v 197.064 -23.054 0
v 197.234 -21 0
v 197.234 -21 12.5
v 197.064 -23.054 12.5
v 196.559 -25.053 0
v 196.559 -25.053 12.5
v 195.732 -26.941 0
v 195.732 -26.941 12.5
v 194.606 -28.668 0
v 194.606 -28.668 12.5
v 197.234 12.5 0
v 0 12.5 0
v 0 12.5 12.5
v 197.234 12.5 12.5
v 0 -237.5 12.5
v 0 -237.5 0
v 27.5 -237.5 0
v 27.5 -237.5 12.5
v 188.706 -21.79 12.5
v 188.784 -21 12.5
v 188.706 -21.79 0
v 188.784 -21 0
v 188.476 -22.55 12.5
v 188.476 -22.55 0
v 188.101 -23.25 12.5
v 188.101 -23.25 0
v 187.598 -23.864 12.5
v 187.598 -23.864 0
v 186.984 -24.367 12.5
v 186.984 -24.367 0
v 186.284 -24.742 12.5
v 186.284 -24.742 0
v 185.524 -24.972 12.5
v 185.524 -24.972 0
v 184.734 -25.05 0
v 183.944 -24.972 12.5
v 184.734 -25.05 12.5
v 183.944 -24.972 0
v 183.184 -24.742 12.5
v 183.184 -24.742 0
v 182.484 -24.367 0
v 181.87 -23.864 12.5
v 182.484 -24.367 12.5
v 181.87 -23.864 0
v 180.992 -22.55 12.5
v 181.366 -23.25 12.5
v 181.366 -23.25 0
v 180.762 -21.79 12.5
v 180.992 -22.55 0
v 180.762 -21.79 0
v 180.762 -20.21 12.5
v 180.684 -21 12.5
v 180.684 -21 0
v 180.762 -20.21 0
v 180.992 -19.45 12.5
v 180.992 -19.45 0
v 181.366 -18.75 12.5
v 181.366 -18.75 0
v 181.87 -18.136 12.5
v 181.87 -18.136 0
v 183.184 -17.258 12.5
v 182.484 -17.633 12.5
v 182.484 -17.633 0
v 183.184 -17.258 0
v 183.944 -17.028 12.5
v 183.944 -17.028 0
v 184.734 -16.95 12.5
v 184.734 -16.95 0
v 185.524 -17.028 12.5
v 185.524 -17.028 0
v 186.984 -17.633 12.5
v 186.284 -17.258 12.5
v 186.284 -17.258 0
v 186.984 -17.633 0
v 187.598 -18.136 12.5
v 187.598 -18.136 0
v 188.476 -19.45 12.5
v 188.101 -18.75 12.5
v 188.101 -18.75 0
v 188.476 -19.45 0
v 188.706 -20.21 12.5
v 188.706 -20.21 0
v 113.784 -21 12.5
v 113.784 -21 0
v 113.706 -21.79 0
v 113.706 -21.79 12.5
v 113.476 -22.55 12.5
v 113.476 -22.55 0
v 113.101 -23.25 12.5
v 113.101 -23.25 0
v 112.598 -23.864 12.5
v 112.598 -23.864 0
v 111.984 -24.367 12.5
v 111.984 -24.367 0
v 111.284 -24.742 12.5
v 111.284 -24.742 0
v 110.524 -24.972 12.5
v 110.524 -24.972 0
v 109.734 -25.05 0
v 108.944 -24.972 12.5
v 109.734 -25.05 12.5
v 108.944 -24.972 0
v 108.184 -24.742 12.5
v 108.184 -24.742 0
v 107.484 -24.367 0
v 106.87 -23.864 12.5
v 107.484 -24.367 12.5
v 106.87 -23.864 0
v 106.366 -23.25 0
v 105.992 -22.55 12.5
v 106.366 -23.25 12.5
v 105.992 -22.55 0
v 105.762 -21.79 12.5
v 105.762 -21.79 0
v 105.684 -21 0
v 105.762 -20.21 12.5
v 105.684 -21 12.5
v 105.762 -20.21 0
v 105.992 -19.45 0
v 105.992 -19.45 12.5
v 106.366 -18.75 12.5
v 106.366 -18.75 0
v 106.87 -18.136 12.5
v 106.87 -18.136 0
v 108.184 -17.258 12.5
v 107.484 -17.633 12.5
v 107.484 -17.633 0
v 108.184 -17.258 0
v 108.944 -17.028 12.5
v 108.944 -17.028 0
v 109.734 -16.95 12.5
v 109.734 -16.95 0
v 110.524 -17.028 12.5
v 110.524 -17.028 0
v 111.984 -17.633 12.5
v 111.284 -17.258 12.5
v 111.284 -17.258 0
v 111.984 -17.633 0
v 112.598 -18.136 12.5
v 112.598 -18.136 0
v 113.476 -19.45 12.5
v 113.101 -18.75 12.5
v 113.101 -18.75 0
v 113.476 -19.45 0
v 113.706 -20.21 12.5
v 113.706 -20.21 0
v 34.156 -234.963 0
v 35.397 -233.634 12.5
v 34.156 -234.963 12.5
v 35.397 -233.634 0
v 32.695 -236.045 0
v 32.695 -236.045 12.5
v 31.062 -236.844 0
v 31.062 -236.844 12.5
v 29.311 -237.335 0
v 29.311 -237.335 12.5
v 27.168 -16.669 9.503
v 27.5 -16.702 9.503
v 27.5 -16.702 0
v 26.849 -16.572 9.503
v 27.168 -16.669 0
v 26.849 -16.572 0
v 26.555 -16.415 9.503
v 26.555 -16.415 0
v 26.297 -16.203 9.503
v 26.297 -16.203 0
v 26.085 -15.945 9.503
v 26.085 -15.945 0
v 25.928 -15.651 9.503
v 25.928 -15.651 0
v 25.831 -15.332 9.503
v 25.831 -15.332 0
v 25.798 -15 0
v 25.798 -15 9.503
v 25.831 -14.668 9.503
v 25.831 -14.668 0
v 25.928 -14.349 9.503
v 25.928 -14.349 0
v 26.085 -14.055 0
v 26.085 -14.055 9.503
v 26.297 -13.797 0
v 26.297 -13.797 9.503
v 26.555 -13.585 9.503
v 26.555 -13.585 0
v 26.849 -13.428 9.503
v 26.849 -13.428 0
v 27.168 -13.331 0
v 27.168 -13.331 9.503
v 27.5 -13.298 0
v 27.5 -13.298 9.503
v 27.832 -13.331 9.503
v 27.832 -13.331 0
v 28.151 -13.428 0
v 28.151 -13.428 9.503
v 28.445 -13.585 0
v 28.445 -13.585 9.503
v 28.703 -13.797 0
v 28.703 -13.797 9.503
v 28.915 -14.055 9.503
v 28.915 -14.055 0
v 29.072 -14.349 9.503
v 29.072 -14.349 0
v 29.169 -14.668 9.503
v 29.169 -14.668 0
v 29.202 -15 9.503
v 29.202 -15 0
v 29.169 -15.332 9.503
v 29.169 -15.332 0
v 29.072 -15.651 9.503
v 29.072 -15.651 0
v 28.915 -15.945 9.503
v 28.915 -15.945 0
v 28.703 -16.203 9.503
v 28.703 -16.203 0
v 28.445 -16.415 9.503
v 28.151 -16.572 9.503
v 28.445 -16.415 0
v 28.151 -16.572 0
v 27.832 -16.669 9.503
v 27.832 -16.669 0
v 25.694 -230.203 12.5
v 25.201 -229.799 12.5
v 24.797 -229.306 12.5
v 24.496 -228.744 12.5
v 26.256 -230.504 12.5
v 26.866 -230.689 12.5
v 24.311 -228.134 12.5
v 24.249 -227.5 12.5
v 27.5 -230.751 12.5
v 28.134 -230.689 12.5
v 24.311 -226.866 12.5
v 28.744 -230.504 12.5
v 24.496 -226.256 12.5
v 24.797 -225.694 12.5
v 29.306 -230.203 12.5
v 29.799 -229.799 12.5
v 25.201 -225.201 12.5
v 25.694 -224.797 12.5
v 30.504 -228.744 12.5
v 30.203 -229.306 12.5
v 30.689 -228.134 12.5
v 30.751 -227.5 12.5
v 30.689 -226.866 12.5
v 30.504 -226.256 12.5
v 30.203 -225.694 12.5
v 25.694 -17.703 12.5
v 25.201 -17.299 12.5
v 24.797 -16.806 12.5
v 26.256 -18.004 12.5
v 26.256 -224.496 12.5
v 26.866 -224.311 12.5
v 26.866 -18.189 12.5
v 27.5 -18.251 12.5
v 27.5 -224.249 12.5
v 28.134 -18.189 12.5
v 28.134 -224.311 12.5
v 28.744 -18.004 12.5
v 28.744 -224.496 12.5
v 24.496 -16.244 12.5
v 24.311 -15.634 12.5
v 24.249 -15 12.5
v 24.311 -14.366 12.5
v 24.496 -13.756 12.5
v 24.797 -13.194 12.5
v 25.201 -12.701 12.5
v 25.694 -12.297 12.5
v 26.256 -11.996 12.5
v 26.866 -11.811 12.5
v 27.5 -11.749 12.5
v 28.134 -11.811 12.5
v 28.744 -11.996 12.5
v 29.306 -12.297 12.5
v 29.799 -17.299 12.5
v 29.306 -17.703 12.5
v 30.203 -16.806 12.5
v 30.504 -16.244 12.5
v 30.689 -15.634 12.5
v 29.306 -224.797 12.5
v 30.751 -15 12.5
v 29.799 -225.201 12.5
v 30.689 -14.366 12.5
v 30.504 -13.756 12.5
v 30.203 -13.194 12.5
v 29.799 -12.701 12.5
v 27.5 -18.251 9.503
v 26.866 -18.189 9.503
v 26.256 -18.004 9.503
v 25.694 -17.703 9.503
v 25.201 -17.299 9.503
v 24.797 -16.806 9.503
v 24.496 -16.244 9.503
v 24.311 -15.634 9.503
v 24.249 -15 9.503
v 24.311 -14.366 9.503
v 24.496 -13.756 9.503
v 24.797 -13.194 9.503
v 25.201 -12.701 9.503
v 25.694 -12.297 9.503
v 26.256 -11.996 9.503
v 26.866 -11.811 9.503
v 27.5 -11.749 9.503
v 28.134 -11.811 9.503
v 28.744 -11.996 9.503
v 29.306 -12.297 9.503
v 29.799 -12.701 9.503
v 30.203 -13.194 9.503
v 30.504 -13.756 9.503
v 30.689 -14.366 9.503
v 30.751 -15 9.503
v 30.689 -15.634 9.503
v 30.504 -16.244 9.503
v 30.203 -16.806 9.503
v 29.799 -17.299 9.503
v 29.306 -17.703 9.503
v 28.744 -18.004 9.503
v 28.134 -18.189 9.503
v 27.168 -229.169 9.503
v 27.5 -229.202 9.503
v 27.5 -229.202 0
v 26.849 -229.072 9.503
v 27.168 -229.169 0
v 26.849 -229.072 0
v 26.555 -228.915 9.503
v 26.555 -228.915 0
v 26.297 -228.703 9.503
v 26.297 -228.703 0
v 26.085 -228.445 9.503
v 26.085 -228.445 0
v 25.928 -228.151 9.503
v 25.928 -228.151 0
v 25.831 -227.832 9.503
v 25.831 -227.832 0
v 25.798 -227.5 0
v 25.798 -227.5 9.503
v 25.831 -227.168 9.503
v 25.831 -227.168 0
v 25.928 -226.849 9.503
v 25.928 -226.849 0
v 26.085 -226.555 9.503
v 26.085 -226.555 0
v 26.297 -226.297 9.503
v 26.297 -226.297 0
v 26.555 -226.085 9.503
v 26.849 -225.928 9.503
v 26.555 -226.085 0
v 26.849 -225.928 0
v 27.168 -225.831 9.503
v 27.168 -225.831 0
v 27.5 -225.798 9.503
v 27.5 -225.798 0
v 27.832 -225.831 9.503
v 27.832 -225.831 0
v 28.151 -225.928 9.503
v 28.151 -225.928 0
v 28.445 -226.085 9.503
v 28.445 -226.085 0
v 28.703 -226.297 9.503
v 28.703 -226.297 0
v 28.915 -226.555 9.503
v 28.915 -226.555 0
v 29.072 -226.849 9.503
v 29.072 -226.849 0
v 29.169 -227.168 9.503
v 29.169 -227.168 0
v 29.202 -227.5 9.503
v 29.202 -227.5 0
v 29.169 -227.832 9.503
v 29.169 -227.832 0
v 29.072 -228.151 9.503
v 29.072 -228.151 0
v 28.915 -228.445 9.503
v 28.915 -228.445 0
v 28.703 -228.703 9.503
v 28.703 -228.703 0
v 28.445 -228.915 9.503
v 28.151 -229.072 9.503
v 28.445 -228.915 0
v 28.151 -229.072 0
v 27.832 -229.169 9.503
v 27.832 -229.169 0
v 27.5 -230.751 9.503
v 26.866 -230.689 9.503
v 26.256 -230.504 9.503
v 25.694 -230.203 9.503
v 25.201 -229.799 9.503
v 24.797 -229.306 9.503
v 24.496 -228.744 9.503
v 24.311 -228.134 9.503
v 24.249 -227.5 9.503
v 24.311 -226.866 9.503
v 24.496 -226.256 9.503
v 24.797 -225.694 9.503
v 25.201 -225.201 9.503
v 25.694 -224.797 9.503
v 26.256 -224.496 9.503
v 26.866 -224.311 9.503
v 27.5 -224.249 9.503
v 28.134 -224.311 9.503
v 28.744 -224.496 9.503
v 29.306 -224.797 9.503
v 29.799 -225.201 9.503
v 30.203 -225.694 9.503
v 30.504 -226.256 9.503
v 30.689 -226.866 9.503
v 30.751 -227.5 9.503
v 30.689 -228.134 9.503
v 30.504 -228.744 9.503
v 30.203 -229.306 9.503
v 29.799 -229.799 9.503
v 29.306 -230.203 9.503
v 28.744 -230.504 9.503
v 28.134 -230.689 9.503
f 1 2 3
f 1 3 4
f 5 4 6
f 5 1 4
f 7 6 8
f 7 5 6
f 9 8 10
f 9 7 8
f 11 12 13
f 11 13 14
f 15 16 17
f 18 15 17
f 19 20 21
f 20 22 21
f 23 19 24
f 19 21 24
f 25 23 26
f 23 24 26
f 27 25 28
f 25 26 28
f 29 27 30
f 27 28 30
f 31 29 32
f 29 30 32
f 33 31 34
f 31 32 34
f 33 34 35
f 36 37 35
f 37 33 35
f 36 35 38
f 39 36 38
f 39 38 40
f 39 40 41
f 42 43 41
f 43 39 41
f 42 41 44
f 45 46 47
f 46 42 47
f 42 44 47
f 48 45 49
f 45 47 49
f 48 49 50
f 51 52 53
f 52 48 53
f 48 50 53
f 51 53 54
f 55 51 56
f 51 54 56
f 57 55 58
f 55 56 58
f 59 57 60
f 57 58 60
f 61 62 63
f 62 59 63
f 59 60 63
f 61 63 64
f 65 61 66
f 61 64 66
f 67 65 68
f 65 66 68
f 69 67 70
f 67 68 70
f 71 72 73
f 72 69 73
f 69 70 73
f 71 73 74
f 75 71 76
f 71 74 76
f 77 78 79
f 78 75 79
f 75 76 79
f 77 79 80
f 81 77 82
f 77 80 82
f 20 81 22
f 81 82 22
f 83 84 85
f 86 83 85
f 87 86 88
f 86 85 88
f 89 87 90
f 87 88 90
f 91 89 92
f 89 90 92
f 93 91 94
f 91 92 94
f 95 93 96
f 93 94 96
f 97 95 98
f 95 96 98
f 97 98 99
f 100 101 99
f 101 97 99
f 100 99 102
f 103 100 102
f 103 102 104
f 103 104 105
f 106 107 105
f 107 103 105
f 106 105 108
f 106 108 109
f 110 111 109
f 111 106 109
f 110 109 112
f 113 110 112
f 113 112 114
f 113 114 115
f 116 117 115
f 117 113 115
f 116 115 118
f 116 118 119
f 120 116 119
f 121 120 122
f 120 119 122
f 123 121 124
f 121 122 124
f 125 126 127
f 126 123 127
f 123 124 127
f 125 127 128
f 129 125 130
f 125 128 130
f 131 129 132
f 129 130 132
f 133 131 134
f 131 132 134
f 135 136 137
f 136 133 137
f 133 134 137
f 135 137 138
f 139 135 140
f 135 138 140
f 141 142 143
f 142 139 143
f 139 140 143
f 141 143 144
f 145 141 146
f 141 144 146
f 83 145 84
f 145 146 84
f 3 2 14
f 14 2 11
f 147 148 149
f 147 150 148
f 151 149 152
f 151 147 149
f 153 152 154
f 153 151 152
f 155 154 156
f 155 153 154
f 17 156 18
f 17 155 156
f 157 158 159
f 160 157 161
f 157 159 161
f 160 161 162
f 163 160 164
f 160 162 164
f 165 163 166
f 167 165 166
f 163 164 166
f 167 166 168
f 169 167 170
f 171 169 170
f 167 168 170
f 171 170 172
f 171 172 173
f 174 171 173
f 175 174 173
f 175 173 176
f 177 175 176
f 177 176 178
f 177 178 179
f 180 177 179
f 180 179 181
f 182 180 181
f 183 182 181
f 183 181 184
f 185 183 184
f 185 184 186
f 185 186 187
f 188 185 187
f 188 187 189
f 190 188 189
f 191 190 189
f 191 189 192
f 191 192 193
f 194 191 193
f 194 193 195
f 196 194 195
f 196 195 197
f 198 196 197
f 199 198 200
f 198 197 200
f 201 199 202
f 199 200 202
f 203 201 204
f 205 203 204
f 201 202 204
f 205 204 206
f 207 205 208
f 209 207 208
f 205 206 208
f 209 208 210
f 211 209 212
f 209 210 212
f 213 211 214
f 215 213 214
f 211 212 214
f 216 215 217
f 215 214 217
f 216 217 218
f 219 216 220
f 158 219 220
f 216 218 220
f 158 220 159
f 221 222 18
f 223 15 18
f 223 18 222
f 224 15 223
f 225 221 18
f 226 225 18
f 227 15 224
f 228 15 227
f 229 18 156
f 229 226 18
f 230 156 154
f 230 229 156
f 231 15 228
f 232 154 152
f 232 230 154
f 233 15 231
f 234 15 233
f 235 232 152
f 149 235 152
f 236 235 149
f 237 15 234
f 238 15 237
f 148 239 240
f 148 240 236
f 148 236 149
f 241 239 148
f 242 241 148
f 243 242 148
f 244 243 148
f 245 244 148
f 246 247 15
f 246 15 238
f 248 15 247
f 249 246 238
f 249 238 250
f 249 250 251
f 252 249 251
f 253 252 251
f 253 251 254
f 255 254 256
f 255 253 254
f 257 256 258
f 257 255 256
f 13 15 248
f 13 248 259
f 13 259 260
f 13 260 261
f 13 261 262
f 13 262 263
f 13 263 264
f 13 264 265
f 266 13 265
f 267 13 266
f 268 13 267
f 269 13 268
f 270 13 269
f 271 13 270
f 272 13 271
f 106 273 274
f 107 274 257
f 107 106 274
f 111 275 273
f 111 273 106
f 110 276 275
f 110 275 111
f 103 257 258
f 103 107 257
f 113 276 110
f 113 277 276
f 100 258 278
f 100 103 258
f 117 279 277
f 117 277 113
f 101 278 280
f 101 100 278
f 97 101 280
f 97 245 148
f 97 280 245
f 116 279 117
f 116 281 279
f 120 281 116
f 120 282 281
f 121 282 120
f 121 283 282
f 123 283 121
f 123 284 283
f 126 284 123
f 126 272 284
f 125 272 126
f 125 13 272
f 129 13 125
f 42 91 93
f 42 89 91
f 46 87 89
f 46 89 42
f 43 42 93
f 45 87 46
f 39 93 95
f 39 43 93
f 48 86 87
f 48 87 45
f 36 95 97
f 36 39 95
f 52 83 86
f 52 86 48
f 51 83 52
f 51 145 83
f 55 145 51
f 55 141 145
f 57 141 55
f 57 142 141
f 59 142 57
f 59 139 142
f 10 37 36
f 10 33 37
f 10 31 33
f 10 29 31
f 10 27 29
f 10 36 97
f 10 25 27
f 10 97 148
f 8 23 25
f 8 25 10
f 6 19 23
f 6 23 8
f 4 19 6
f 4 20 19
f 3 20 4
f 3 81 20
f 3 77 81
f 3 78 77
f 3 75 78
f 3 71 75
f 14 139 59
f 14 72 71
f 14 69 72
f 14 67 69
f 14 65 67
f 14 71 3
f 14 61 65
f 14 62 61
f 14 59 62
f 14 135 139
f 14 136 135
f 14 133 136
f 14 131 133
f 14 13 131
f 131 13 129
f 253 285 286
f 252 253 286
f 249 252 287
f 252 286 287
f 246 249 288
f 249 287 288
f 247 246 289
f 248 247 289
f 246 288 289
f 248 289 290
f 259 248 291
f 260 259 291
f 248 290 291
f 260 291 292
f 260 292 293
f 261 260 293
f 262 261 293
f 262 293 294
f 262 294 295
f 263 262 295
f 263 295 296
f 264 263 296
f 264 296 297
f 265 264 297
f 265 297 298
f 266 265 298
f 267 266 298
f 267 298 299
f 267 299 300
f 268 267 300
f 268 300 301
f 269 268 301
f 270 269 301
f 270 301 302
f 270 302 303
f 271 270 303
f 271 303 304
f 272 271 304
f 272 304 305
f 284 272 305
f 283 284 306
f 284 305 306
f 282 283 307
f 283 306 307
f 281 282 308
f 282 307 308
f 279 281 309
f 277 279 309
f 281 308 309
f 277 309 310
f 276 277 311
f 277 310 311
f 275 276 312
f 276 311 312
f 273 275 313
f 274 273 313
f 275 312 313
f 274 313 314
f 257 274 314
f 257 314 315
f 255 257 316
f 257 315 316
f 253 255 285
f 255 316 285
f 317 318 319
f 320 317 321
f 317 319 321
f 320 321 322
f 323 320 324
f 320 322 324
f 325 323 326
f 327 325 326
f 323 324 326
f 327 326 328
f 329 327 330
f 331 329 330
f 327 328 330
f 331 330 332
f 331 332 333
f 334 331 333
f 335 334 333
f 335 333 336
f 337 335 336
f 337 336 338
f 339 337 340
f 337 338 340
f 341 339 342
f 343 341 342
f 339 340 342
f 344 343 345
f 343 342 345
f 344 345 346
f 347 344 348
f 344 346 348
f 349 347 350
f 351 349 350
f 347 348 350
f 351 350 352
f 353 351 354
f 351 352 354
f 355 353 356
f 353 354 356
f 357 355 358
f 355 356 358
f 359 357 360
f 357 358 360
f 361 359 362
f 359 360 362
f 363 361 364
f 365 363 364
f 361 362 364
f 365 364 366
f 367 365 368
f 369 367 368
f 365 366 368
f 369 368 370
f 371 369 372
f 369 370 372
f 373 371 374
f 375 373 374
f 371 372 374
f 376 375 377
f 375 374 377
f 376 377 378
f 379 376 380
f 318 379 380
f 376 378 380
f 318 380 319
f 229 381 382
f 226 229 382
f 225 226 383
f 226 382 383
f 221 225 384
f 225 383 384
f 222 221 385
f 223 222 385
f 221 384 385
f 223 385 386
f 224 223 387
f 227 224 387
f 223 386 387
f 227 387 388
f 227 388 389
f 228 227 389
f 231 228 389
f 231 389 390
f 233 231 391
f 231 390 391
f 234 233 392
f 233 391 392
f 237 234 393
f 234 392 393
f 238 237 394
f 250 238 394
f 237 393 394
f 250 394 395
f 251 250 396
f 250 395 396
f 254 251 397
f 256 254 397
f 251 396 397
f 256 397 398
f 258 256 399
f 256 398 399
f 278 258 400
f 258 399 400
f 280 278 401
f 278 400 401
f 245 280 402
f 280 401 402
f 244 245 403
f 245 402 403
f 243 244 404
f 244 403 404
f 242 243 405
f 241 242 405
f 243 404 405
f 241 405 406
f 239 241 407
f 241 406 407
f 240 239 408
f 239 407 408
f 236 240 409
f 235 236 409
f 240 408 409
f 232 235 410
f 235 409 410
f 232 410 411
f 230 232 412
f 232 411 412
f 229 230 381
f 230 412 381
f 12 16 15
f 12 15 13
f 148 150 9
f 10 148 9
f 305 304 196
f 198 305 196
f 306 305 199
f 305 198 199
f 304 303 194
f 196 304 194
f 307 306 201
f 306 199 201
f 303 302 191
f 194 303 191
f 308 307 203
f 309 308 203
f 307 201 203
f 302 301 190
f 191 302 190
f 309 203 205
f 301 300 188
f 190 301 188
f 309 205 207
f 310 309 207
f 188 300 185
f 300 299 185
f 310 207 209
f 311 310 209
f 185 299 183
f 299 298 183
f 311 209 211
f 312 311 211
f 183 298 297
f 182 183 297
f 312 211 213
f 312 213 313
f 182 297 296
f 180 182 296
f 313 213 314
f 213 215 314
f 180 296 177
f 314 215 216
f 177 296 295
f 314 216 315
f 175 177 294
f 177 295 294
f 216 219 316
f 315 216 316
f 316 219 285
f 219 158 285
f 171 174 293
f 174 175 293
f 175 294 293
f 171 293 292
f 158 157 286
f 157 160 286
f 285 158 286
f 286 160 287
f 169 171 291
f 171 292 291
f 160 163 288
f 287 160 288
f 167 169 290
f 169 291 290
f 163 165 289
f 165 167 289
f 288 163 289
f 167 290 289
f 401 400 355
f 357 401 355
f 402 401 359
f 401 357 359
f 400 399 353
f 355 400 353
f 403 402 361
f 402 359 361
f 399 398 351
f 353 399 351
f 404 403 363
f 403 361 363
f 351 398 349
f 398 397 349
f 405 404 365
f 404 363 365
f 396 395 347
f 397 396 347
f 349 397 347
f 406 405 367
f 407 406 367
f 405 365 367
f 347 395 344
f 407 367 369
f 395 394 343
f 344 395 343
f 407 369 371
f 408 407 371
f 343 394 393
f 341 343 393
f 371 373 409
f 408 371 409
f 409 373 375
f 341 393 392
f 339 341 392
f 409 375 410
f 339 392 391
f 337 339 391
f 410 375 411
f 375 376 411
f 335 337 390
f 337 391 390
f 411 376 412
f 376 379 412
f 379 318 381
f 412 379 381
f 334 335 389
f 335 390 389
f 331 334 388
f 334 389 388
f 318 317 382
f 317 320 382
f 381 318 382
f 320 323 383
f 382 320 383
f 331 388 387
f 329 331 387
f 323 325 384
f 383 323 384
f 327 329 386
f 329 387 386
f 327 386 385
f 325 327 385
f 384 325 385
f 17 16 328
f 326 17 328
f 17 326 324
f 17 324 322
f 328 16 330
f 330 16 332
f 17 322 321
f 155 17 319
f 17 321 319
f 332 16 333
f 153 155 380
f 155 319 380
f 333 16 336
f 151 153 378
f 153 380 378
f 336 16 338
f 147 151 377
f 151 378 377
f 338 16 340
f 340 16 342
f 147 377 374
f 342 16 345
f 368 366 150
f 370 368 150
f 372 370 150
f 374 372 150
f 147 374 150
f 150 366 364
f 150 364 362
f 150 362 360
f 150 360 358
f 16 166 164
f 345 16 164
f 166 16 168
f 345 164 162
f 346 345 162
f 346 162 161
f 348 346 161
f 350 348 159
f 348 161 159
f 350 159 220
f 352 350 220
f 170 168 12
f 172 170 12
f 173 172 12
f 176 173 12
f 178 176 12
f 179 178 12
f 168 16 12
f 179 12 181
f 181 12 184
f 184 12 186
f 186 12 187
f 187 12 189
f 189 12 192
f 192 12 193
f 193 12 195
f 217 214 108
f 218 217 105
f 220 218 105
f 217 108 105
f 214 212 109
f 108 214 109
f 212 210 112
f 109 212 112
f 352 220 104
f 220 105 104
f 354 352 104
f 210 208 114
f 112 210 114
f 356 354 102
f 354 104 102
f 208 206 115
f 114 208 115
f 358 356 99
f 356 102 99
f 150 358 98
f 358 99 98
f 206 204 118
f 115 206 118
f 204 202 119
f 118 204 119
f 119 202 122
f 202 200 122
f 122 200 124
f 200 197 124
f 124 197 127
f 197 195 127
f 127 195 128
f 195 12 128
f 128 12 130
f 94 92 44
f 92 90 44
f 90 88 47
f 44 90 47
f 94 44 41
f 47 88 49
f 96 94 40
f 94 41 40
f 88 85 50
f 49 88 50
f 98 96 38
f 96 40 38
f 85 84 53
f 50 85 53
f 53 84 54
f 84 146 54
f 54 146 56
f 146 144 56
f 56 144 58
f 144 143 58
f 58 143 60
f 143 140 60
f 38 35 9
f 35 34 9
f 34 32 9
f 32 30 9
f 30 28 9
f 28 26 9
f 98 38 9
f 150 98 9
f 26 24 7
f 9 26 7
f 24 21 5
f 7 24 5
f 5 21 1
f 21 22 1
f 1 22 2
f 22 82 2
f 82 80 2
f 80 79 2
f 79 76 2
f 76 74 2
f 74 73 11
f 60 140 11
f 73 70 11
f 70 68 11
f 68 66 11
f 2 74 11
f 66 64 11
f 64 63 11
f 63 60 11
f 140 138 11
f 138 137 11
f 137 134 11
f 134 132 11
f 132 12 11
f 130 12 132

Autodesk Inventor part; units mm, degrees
ref_plane "YZ Plane" through (0, 0, 0) normal (1, 0, 0) x (0, 1, 0)
ref_plane "XZ Plane" through (0, 0, 0) normal (0, 1, 0) x (-1, 0, 0)
ref_plane "XY Plane" through (0, 0, 0) normal (0, 0, 1) x (1, 0, 0)
ref_plane "Work Plane1" through (0, 142.0555, 0) normal (0, 0, 1) x (1, 0, 0)
sketch "Sketch1" plane through (0, 142.0555, 0) normal (0, 0, 1) x (1, 0, 0)
  line L0 (450, -129.5555) -> (450, -142.0555) projected
  line L1 (0, -129.5555) -> (450, -129.5555) projected
  line L2 (0, -142.0555) -> (0, -129.5555) projected
  line L3 (450, -142.0555) -> (0, -142.0555) projected
  circle A0 centre (109.7339, -163.0555) radius 4.05 projected
  circle A1 centre (184.7339, -163.0555) radius 4.05 projected
  line L4 (92.2339, -147.0555) -> (92.2339, -142.0555) projected
  arc A2 (97.2339, -152.0555) -> (92.2339, -147.0555) centre (92.2339, -152.0555) ccw projected
  line L5 (97.2339, -152.0555) -> (97.2339, -163.0555) projected
  arc A3 (97.2339, -163.0555) -> (122.2339, -163.0555) centre (109.7339, -163.0555) ccw projected
  line L6 (122.2339, -163.0555) -> (122.2339, -152.0555) projected
  arc A4 (127.2339, -147.0555) -> (122.2339, -152.0555) centre (127.2339, -152.0555) ccw projected
  line L7 (127.2339, -147.0555) -> (167.2339, -147.0555) projected
  arc A5 (172.2339, -152.0555) -> (167.2339, -147.0555) centre (167.2339, -152.0555) ccw projected
  line L8 (172.2339, -152.0555) -> (172.2339, -163.0555) projected
  arc A6 (172.2339, -163.0555) -> (197.2339, -163.0555) centre (184.7339, -163.0555) ccw projected
  line L9 (197.2339, -163.0555) -> (197.2339, -152.0555) projected
  arc A7 (202.2339, -147.0555) -> (197.2339, -152.0555) centre (202.2339, -152.0555) ccw projected
  line L10 (202.2339, -142.0555) -> (202.2339, -147.0555) projected
  line L11 (92.2339, -142.0555) -> (202.2339, -142.0555) projected
  line L12 (0, -129.5555) -> (0, -379.5555)
  line L13 (0, -379.5555) -> (27.5, -379.5555)
  line L14 (35.3974, -375.6899) -> (194.6057, -170.7235)
  line L15 (197.2339, -163.0555) -> (197.2339, -129.5555)
  line L16 (0, -129.5555) -> (197.2339, -129.5555)
  arc A8 (194.6057, -170.7235) -> (197.2339, -163.0555) centre (184.7339, -163.0555) ccw
  arc A9 (27.5, -379.5555) -> (35.3974, -375.6899) centre (27.5, -369.5555) ccw
  dimension "d2" = 250
  dimension "d5" = 20
  dimension "d6" = 27.5
extrude "Extrusion1" add sketch "Sketch1" along normal blind 12.5 contours L15 L3 L2 L1 | L15 L9 A6 L8 A5 L7 A4 L6 A3 L5 A2 L4 L3 | L3 L4 A2 L5 A3 L6 A4 L7 A5 L8 A6 L14 A9 L13 L12
sketch "Sketch2" plane through (0, 142.0555, 0) normal (0, 0, -1) x (-1, 0, 0)
  circle A0 centre (-27.5, -369.5555) radius 1.55
  circle A1 centre (-27.5, -157.0555) radius 1.55
  point P0 (0, -142.0555)
extrude "Extrusion2" cut sketch "Sketch2" against normal through all
sketch "Sketch3" plane through (0, 142.0555, 12.5) normal (0, 0, 1) x (1, 0, 0)
  circle A0 centre (27.5, -157.0555) radius 1.55 projected
  arc A1 (27.5, -379.5555) -> (35.3974, -375.6899) centre (27.5, -369.5555) ccw projected
  point P0 (0, -142.0555)
hole "Hole1" at (27.5, -15, 12.5) at (27.5, -227.5, 12.5) direction (0, 0, -1) diameter 3.4036 end through all counterbore diameter 6.5024 counterbore depth 2.9972 clearance for "Socket Head Cap Screw" size "M3" standard "Ansi Metric M Profile"
properties part number "side support"
